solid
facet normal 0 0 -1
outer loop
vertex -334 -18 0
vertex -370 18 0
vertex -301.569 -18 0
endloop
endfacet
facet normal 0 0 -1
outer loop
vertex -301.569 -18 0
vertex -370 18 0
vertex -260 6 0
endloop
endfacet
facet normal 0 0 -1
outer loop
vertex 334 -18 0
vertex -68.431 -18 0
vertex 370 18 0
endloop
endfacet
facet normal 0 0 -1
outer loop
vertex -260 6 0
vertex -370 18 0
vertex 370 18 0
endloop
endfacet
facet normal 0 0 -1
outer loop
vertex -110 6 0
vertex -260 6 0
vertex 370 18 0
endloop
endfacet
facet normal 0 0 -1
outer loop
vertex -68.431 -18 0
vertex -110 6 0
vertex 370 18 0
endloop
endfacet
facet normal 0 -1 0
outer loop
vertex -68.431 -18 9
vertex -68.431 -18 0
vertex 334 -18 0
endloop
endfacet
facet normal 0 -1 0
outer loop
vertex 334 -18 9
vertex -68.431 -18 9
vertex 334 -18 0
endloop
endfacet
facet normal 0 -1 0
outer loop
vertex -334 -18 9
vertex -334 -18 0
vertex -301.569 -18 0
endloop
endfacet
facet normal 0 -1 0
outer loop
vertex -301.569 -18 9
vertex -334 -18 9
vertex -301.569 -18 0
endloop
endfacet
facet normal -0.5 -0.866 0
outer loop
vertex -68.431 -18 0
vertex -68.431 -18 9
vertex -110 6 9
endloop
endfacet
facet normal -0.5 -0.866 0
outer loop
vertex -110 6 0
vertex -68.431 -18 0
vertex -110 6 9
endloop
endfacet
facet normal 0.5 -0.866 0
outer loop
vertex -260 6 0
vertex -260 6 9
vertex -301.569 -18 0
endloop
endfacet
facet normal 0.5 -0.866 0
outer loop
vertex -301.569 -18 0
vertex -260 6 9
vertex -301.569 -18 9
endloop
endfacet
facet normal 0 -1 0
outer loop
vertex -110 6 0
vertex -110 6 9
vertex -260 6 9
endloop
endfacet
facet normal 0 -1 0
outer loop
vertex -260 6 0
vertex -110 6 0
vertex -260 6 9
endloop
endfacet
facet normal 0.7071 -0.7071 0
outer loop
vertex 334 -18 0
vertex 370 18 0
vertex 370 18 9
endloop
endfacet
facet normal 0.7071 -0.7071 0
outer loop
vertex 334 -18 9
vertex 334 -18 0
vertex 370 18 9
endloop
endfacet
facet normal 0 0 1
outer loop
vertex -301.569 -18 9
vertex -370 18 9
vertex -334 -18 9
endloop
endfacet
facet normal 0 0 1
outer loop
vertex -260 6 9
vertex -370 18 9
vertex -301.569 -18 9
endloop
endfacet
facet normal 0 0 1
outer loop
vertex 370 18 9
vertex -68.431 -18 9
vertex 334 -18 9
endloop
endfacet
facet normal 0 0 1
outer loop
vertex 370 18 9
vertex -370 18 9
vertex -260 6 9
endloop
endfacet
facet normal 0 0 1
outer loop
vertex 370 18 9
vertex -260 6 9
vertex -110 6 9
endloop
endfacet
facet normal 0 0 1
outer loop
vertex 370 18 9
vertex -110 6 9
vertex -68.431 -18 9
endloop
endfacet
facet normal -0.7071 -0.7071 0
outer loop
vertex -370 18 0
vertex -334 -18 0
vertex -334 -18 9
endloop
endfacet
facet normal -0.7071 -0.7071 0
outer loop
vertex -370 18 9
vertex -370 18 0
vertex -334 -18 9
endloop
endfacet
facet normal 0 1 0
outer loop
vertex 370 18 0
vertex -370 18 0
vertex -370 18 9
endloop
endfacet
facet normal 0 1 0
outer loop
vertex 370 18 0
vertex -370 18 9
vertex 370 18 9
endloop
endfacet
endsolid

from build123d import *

# Parameters (mm, degrees)
F0_W     = 740
F0_H     = 36
F1_DEPTH = 9
F2_SIZE  = 35.99999
F4_DEPTH = 9


# Not quite as in the source:
# - a fillet or chamfer is up to 0.001 mm smaller than in the source, because OpenCascade refuses the exact size


with BuildPart() as f1:
    # F0 (on Top) → F1 (new body)
    with BuildSketch(Plane.XY):
        Rectangle(F0_W, F0_H)
    extrude(amount=F1_DEPTH)

    # F2 (size 36 in the source; OpenCascade refuses exactly that, so slightly less here)
    f2_edges = [f1.edges().sort_by_distance(p)[0] for p in [
        (-370, -18, 4.5),
        (370, -18, 4.5),
    ]]
    chamfer(f2_edges, length=F2_SIZE)

    # F3 (on face) → F4 (cut, through all)
    with BuildSketch(Plane.XY.offset(9)):
        Polygon((-301.5692193817, -18), (-68.4307806183, -18), (-110, 6), (-260, 6), align=None)
    extrude(amount=-F4_DEPTH, mode=Mode.SUBTRACT)


solid = f1.part
